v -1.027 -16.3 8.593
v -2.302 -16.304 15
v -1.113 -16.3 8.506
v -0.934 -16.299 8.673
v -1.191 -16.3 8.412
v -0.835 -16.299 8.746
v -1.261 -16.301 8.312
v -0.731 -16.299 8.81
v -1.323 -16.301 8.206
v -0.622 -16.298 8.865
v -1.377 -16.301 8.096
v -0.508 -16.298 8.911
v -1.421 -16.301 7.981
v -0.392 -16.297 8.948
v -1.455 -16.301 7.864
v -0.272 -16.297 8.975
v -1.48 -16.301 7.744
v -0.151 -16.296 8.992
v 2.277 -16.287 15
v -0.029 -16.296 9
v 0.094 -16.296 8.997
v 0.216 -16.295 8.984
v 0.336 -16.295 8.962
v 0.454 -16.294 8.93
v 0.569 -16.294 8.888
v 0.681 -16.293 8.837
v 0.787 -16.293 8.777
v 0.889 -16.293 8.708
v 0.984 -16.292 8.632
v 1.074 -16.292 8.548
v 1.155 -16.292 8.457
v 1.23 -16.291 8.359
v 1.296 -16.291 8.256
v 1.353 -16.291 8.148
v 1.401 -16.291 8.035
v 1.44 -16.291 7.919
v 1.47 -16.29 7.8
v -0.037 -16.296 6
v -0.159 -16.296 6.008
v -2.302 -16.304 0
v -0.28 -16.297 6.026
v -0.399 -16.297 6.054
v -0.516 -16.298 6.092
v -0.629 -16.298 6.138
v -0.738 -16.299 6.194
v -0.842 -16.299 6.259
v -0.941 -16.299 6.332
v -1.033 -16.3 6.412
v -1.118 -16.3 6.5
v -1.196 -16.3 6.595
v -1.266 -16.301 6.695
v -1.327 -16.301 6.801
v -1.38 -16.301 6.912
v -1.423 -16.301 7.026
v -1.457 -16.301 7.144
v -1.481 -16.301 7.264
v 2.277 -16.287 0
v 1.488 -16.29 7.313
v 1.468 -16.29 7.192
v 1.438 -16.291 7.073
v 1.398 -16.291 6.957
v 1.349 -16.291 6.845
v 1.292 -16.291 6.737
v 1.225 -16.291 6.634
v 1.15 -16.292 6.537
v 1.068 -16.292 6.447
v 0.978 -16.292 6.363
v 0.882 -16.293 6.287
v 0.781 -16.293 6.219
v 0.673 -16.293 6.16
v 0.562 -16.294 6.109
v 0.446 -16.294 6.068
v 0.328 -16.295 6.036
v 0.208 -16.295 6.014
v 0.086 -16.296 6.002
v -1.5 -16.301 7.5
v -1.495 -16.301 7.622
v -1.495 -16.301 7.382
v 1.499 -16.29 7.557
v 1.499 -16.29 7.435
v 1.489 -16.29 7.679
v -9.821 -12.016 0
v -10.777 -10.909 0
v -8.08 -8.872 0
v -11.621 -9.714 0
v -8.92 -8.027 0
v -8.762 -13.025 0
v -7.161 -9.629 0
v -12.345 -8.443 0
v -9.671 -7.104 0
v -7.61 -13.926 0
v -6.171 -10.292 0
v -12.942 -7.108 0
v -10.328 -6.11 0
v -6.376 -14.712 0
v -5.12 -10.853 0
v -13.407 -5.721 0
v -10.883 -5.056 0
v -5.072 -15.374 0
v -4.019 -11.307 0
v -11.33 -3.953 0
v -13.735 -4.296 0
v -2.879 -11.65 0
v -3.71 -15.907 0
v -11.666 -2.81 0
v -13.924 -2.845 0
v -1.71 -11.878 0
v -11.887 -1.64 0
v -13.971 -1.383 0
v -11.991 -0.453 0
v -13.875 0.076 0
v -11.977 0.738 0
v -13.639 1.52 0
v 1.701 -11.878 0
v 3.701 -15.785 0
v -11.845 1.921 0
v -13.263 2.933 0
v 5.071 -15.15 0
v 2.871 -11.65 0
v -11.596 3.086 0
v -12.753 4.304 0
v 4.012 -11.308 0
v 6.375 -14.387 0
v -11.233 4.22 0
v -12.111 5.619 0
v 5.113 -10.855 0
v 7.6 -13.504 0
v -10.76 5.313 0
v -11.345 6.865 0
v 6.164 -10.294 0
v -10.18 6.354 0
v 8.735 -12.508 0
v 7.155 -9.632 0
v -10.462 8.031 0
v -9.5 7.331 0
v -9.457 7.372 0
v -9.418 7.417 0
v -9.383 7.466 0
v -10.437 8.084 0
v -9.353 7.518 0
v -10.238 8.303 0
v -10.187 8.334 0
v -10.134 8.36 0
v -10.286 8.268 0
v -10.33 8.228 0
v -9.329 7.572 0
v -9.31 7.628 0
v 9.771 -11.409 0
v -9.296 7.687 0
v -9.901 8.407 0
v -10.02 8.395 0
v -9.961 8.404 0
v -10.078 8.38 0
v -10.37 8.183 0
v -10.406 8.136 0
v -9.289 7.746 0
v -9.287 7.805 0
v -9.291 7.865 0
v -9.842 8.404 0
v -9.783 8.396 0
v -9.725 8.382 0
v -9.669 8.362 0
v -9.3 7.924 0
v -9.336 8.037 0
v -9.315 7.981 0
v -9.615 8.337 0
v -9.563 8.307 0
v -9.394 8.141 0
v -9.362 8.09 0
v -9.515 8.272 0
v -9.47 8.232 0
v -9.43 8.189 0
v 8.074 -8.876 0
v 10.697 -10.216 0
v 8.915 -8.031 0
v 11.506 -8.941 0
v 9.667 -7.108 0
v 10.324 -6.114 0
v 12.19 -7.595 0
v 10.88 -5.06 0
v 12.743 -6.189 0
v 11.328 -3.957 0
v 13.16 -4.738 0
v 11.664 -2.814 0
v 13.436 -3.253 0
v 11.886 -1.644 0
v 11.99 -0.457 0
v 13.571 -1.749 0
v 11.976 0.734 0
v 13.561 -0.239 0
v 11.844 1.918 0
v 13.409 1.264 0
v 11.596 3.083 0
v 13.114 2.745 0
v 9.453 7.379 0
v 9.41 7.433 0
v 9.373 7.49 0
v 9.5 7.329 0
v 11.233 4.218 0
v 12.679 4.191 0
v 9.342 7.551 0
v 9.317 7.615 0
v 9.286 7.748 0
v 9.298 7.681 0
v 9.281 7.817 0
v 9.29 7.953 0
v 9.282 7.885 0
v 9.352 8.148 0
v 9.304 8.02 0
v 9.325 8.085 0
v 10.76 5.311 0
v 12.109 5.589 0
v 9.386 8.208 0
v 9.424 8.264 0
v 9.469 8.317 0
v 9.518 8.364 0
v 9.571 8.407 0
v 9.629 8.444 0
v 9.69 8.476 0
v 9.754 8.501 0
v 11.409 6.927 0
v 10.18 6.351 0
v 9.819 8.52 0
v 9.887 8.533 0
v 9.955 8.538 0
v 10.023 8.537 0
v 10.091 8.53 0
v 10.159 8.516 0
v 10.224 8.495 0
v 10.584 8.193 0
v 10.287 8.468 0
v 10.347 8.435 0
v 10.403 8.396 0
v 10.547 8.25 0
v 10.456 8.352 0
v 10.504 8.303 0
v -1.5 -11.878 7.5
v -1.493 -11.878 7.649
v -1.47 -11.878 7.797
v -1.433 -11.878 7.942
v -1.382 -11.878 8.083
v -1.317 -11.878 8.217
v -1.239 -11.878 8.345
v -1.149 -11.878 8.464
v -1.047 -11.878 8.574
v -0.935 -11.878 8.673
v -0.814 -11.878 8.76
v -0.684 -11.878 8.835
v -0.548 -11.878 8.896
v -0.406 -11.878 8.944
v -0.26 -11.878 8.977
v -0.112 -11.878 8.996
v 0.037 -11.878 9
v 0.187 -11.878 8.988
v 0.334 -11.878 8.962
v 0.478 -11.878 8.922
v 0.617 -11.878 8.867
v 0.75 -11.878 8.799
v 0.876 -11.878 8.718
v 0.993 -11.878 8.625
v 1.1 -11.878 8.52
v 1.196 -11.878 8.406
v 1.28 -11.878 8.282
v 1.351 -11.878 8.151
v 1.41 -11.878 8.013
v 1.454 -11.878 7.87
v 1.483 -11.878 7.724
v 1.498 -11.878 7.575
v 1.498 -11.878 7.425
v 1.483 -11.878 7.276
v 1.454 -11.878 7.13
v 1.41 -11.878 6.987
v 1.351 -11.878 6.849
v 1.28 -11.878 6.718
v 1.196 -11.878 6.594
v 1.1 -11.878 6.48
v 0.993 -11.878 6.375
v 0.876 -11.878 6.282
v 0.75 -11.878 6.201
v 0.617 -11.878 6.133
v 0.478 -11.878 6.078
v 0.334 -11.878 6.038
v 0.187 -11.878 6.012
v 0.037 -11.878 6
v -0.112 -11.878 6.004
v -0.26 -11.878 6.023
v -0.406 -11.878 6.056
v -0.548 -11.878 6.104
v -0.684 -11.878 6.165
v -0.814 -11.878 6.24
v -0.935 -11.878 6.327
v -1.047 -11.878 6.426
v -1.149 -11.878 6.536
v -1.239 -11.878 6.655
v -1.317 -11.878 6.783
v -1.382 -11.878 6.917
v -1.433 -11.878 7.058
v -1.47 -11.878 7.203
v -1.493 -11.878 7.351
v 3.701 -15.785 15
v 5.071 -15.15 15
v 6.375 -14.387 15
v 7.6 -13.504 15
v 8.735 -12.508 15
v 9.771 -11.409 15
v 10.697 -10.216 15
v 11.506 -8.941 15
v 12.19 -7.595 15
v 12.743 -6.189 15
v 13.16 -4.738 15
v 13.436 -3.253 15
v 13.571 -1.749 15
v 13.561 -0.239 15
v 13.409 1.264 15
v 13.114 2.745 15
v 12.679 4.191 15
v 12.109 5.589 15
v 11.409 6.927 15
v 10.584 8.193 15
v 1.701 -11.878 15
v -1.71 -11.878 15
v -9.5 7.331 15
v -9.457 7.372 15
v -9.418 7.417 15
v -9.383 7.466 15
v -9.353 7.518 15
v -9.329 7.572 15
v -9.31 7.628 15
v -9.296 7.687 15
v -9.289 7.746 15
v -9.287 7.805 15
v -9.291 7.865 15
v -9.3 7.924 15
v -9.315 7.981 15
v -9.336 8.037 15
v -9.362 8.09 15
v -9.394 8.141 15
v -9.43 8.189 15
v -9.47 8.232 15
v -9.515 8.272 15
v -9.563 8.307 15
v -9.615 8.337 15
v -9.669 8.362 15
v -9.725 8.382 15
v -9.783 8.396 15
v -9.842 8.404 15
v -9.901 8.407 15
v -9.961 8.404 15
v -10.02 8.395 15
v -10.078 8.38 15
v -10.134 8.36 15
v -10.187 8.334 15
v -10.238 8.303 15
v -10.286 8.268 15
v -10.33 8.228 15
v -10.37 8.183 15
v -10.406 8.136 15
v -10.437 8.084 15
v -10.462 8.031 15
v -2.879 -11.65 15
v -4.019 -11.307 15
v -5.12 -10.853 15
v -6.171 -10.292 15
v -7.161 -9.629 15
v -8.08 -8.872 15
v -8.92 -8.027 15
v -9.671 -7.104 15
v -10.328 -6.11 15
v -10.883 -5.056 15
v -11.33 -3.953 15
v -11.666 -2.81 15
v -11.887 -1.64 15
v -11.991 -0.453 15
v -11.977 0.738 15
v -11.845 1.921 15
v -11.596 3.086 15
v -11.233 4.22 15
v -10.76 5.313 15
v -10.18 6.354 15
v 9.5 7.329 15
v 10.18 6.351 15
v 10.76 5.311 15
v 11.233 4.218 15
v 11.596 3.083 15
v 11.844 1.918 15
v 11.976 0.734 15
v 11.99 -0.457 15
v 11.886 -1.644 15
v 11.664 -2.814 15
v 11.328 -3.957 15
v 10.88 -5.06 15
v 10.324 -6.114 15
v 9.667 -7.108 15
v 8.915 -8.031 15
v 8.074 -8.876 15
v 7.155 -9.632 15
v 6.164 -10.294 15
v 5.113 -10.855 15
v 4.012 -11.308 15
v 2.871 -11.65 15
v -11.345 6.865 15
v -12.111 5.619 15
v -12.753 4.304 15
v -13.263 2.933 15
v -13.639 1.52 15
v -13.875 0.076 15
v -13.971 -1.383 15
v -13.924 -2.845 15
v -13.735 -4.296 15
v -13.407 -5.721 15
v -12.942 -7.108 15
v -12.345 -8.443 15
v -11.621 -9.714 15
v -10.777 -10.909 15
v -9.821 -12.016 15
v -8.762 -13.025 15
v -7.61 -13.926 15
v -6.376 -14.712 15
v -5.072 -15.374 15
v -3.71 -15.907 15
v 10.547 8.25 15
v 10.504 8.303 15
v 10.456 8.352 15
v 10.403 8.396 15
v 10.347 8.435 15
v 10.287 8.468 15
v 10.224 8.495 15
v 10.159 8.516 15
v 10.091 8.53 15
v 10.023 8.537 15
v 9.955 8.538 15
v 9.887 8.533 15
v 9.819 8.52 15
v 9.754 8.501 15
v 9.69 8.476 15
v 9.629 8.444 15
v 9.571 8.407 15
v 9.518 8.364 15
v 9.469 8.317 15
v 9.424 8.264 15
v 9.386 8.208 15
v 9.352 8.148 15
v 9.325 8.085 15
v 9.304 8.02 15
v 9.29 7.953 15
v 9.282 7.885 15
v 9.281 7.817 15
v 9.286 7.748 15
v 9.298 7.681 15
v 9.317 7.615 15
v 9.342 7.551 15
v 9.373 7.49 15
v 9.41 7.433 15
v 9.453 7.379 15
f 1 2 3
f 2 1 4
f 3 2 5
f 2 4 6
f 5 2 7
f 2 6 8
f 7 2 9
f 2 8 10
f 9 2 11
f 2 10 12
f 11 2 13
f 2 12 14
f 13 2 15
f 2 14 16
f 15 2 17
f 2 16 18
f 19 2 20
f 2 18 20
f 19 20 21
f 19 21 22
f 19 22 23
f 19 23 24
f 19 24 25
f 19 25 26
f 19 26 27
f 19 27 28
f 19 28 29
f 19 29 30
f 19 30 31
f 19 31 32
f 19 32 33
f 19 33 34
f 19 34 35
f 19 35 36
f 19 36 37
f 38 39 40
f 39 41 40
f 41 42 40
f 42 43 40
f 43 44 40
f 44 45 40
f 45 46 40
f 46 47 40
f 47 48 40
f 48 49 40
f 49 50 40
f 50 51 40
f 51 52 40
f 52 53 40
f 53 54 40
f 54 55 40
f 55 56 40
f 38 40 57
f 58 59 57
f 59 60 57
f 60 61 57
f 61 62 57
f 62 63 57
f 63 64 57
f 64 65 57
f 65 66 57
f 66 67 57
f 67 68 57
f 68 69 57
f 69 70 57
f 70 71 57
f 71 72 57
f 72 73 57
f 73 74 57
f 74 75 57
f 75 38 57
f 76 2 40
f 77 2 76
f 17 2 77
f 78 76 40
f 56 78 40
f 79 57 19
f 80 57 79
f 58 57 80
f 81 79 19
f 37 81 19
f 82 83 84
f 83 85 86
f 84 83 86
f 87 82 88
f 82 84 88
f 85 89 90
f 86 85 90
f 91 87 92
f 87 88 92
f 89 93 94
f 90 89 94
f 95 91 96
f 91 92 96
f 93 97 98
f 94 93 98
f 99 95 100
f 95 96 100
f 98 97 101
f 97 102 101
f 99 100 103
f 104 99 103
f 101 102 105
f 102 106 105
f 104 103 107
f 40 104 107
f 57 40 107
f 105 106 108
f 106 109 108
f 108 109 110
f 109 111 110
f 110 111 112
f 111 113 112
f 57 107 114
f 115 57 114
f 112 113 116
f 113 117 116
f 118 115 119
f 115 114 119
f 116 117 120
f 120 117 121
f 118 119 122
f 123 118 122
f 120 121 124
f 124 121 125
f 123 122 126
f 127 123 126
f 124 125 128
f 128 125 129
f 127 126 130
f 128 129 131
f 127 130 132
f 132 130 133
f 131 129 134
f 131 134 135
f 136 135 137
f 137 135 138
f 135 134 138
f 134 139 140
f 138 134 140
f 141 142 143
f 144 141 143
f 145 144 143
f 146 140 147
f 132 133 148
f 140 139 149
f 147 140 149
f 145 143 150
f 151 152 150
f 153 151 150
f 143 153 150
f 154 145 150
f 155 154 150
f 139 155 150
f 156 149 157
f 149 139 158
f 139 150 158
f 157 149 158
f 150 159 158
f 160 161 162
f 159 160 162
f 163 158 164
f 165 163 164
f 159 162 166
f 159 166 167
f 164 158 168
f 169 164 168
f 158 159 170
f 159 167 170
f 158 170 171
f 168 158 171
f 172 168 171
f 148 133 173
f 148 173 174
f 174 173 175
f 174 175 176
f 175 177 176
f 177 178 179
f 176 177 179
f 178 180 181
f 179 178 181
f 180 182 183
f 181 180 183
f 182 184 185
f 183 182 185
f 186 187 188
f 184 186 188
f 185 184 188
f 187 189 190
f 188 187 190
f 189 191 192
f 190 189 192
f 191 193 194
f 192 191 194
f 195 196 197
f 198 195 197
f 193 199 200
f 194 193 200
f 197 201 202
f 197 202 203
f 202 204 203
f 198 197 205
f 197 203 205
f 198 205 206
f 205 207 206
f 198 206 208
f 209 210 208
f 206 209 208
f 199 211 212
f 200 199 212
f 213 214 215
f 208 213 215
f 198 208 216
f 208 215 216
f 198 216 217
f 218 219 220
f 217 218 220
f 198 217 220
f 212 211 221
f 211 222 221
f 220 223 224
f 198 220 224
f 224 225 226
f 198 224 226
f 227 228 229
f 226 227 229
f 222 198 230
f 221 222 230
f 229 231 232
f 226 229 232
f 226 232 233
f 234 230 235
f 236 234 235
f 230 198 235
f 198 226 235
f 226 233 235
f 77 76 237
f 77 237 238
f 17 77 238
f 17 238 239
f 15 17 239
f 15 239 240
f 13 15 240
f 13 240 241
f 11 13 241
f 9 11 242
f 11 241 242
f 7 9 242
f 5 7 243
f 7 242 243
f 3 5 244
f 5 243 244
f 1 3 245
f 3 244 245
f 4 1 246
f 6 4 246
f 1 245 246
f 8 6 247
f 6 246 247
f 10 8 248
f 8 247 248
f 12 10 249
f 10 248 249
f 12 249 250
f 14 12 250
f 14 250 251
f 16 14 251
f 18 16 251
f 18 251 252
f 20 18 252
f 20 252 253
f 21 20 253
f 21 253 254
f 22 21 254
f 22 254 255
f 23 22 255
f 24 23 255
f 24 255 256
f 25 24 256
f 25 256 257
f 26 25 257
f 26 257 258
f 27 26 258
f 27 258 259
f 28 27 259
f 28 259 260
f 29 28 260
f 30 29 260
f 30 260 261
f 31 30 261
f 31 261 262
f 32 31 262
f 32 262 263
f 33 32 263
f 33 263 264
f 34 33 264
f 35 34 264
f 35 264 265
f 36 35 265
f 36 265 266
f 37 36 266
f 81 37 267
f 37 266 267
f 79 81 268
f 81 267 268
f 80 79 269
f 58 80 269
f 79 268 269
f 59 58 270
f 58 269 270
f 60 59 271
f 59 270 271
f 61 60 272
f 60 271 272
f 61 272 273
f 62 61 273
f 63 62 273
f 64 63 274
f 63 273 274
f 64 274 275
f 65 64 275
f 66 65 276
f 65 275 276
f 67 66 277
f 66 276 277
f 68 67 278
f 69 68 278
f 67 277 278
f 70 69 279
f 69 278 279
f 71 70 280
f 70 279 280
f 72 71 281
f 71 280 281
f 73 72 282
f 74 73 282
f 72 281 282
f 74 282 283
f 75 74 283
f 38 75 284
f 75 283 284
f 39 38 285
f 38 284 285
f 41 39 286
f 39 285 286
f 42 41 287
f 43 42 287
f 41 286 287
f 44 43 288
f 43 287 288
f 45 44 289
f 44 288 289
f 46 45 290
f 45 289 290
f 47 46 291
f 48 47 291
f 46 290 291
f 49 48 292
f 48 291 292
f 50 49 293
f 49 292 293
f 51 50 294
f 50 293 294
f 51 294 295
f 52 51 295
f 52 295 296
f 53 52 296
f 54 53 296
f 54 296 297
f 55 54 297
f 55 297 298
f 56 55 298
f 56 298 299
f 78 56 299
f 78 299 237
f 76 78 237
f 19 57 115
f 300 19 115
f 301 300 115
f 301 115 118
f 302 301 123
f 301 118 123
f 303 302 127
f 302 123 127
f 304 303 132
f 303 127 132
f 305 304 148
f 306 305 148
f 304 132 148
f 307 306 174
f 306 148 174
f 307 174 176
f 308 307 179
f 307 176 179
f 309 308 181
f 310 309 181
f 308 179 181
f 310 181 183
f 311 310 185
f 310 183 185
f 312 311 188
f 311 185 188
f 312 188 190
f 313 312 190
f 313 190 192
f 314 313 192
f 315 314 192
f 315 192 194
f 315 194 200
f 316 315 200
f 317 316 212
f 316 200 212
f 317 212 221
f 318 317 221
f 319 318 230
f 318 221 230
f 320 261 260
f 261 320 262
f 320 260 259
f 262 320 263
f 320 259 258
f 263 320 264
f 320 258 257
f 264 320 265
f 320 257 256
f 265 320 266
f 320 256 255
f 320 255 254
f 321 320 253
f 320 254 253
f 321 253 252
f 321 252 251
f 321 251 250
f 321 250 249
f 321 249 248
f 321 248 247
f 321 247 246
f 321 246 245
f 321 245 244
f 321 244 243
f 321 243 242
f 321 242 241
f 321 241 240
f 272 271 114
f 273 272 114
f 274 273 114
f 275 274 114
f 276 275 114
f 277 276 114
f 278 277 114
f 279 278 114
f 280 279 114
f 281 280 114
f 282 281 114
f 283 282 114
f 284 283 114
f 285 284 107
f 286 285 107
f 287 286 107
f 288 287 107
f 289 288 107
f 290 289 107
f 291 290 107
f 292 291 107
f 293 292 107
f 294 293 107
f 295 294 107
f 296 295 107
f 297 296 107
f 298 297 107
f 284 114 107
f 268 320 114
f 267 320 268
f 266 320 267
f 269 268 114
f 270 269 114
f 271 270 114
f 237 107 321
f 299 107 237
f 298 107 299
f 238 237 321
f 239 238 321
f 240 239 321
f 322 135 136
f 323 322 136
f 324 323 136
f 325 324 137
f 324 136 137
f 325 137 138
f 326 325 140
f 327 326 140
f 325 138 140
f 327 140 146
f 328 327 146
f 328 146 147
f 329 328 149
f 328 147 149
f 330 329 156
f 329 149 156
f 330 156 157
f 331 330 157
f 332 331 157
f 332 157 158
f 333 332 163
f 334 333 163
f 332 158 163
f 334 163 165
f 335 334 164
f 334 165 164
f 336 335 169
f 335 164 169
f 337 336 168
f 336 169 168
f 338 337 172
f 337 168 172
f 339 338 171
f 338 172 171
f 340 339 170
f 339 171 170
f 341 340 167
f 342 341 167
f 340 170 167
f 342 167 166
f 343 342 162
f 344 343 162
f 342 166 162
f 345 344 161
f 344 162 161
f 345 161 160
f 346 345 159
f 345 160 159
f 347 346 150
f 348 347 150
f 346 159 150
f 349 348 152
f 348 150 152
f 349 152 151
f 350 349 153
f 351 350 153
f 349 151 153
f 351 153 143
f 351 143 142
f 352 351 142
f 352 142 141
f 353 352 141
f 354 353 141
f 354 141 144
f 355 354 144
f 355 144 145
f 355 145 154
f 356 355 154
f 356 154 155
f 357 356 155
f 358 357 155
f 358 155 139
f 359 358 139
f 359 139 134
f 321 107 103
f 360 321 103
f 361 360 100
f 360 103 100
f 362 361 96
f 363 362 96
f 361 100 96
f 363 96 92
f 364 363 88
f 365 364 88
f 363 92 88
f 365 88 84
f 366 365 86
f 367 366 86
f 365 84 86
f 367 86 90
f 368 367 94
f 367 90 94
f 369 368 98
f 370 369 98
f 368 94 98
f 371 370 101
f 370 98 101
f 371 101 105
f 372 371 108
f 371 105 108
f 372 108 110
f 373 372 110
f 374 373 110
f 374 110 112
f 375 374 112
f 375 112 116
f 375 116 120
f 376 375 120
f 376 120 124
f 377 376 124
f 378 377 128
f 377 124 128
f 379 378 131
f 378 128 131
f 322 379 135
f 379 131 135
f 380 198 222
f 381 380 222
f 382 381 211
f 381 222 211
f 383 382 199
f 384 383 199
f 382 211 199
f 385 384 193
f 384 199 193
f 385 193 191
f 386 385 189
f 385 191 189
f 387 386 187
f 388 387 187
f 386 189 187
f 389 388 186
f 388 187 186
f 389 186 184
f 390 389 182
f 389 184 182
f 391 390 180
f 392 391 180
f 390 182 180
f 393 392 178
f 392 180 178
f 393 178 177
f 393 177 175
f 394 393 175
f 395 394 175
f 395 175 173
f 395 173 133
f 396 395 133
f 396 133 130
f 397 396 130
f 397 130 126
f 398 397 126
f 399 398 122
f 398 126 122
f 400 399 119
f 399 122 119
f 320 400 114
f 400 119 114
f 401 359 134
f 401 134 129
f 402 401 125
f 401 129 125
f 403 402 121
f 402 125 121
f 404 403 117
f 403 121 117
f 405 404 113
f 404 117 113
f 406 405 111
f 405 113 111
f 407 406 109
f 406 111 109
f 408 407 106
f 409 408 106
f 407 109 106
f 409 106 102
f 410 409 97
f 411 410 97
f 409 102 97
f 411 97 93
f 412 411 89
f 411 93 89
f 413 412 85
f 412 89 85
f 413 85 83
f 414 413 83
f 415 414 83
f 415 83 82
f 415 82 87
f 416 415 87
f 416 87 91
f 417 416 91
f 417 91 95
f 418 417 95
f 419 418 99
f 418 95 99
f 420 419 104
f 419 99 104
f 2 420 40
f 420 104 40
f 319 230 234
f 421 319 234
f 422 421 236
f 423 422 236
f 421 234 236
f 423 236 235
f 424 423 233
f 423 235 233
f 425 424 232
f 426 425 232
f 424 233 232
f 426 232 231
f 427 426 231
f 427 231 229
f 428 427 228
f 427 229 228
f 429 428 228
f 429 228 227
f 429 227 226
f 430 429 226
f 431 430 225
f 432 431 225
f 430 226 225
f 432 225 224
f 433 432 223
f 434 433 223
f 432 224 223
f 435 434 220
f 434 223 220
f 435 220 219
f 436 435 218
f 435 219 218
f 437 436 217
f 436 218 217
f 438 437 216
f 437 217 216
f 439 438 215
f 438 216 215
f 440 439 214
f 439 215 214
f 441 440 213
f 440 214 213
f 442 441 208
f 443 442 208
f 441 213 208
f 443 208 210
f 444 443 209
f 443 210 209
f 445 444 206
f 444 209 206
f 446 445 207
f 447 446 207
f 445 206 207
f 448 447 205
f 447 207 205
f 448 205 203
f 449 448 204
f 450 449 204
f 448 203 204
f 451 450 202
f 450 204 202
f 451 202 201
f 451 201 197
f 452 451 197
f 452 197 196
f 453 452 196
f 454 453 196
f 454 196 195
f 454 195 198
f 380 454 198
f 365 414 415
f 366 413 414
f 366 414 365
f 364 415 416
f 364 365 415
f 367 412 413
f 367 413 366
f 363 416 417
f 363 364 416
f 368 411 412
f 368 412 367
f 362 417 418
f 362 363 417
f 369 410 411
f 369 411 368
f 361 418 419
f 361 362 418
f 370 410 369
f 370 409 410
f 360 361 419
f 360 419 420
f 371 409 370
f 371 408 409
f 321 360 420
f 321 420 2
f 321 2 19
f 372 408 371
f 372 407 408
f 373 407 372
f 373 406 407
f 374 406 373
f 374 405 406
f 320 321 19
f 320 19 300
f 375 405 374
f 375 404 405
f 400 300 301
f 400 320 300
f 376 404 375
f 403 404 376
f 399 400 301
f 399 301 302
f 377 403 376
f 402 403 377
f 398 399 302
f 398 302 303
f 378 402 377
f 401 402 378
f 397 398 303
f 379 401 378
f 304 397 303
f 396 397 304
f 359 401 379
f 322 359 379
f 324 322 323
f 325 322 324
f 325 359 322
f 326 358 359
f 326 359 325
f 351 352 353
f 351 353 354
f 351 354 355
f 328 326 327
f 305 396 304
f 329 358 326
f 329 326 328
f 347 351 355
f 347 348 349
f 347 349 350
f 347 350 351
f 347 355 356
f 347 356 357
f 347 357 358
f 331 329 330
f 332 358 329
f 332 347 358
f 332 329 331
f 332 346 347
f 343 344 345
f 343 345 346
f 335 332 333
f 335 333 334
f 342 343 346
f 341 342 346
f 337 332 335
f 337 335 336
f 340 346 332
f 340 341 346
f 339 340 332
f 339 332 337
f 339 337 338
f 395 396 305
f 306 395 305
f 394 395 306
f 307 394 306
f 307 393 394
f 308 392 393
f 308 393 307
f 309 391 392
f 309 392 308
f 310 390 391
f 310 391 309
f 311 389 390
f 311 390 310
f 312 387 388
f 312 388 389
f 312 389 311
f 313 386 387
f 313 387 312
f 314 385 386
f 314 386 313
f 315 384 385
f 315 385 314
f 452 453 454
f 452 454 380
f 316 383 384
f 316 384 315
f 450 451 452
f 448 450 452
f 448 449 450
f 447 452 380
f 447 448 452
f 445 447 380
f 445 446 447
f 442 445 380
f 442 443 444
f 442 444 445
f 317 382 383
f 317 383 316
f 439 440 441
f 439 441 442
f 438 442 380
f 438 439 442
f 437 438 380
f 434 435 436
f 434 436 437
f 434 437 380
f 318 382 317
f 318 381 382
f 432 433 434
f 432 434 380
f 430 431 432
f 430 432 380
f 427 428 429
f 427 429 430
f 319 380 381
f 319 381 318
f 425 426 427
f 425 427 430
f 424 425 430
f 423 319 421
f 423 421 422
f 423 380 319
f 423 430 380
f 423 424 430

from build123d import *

# Parameters (mm, degrees)
F1_DEPTH = 15
F2_R     = 1.5
F3_DEPTH = 4.4278798556


# Not quite as in the source:
# - a feature names something its author has since deleted; it is built from what else it names


with BuildPart() as f1:
    # F0 (on Top) → F1 (new body)
    with BuildSketch(Plane.XY):
        with BuildLine():
            Line((1.7011785064, -11.877588293), (-1.7096480171, -11.877588293))
            ThreePointArc((-1.7096480171, -11.877588293), (-11.1202848878, -4.5099073176), (-9.5, 7.3314391493))
            ThreePointArc((-9.5, 7.3314391493), (-9.5385768198, 8.2900827327), (-10.4622412473, 8.0306030295))
            ThreePointArc((-10.4622412473, 8.0306030295), (-13.1913649606, -6.4201767786), (-2.3021989036, -16.3044681486))
            Line((-2.3021989036, -16.3044681486), (2.2770734892, -16.2874199147))
            ThreePointArc((2.2770734892, -16.2874199147), (12.7428435218, -6.1893456412), (10.5841437277, 8.1927078148))
            ThreePointArc((10.5841437277, 8.1927078148), (9.5441810303, 8.3863903947), (9.5, 7.3294687371))
            ThreePointArc((9.5, 7.3294687371), (11.1173000284, -4.5140615908), (1.7011785064, -11.877588293))
        make_face()
    extrude(amount=F1_DEPTH)

    # F2 (on face) → F3 (cut, through all)
    with BuildSketch(Plane(origin=(0, -11.877588293, 0), x_dir=(-1, 0, 0), z_dir=(0, 1, 0))):
        with Locations((0, 7.5)):
            Circle(F2_R)
    extrude(amount=-F3_DEPTH, mode=Mode.SUBTRACT)


solid = f1.part
